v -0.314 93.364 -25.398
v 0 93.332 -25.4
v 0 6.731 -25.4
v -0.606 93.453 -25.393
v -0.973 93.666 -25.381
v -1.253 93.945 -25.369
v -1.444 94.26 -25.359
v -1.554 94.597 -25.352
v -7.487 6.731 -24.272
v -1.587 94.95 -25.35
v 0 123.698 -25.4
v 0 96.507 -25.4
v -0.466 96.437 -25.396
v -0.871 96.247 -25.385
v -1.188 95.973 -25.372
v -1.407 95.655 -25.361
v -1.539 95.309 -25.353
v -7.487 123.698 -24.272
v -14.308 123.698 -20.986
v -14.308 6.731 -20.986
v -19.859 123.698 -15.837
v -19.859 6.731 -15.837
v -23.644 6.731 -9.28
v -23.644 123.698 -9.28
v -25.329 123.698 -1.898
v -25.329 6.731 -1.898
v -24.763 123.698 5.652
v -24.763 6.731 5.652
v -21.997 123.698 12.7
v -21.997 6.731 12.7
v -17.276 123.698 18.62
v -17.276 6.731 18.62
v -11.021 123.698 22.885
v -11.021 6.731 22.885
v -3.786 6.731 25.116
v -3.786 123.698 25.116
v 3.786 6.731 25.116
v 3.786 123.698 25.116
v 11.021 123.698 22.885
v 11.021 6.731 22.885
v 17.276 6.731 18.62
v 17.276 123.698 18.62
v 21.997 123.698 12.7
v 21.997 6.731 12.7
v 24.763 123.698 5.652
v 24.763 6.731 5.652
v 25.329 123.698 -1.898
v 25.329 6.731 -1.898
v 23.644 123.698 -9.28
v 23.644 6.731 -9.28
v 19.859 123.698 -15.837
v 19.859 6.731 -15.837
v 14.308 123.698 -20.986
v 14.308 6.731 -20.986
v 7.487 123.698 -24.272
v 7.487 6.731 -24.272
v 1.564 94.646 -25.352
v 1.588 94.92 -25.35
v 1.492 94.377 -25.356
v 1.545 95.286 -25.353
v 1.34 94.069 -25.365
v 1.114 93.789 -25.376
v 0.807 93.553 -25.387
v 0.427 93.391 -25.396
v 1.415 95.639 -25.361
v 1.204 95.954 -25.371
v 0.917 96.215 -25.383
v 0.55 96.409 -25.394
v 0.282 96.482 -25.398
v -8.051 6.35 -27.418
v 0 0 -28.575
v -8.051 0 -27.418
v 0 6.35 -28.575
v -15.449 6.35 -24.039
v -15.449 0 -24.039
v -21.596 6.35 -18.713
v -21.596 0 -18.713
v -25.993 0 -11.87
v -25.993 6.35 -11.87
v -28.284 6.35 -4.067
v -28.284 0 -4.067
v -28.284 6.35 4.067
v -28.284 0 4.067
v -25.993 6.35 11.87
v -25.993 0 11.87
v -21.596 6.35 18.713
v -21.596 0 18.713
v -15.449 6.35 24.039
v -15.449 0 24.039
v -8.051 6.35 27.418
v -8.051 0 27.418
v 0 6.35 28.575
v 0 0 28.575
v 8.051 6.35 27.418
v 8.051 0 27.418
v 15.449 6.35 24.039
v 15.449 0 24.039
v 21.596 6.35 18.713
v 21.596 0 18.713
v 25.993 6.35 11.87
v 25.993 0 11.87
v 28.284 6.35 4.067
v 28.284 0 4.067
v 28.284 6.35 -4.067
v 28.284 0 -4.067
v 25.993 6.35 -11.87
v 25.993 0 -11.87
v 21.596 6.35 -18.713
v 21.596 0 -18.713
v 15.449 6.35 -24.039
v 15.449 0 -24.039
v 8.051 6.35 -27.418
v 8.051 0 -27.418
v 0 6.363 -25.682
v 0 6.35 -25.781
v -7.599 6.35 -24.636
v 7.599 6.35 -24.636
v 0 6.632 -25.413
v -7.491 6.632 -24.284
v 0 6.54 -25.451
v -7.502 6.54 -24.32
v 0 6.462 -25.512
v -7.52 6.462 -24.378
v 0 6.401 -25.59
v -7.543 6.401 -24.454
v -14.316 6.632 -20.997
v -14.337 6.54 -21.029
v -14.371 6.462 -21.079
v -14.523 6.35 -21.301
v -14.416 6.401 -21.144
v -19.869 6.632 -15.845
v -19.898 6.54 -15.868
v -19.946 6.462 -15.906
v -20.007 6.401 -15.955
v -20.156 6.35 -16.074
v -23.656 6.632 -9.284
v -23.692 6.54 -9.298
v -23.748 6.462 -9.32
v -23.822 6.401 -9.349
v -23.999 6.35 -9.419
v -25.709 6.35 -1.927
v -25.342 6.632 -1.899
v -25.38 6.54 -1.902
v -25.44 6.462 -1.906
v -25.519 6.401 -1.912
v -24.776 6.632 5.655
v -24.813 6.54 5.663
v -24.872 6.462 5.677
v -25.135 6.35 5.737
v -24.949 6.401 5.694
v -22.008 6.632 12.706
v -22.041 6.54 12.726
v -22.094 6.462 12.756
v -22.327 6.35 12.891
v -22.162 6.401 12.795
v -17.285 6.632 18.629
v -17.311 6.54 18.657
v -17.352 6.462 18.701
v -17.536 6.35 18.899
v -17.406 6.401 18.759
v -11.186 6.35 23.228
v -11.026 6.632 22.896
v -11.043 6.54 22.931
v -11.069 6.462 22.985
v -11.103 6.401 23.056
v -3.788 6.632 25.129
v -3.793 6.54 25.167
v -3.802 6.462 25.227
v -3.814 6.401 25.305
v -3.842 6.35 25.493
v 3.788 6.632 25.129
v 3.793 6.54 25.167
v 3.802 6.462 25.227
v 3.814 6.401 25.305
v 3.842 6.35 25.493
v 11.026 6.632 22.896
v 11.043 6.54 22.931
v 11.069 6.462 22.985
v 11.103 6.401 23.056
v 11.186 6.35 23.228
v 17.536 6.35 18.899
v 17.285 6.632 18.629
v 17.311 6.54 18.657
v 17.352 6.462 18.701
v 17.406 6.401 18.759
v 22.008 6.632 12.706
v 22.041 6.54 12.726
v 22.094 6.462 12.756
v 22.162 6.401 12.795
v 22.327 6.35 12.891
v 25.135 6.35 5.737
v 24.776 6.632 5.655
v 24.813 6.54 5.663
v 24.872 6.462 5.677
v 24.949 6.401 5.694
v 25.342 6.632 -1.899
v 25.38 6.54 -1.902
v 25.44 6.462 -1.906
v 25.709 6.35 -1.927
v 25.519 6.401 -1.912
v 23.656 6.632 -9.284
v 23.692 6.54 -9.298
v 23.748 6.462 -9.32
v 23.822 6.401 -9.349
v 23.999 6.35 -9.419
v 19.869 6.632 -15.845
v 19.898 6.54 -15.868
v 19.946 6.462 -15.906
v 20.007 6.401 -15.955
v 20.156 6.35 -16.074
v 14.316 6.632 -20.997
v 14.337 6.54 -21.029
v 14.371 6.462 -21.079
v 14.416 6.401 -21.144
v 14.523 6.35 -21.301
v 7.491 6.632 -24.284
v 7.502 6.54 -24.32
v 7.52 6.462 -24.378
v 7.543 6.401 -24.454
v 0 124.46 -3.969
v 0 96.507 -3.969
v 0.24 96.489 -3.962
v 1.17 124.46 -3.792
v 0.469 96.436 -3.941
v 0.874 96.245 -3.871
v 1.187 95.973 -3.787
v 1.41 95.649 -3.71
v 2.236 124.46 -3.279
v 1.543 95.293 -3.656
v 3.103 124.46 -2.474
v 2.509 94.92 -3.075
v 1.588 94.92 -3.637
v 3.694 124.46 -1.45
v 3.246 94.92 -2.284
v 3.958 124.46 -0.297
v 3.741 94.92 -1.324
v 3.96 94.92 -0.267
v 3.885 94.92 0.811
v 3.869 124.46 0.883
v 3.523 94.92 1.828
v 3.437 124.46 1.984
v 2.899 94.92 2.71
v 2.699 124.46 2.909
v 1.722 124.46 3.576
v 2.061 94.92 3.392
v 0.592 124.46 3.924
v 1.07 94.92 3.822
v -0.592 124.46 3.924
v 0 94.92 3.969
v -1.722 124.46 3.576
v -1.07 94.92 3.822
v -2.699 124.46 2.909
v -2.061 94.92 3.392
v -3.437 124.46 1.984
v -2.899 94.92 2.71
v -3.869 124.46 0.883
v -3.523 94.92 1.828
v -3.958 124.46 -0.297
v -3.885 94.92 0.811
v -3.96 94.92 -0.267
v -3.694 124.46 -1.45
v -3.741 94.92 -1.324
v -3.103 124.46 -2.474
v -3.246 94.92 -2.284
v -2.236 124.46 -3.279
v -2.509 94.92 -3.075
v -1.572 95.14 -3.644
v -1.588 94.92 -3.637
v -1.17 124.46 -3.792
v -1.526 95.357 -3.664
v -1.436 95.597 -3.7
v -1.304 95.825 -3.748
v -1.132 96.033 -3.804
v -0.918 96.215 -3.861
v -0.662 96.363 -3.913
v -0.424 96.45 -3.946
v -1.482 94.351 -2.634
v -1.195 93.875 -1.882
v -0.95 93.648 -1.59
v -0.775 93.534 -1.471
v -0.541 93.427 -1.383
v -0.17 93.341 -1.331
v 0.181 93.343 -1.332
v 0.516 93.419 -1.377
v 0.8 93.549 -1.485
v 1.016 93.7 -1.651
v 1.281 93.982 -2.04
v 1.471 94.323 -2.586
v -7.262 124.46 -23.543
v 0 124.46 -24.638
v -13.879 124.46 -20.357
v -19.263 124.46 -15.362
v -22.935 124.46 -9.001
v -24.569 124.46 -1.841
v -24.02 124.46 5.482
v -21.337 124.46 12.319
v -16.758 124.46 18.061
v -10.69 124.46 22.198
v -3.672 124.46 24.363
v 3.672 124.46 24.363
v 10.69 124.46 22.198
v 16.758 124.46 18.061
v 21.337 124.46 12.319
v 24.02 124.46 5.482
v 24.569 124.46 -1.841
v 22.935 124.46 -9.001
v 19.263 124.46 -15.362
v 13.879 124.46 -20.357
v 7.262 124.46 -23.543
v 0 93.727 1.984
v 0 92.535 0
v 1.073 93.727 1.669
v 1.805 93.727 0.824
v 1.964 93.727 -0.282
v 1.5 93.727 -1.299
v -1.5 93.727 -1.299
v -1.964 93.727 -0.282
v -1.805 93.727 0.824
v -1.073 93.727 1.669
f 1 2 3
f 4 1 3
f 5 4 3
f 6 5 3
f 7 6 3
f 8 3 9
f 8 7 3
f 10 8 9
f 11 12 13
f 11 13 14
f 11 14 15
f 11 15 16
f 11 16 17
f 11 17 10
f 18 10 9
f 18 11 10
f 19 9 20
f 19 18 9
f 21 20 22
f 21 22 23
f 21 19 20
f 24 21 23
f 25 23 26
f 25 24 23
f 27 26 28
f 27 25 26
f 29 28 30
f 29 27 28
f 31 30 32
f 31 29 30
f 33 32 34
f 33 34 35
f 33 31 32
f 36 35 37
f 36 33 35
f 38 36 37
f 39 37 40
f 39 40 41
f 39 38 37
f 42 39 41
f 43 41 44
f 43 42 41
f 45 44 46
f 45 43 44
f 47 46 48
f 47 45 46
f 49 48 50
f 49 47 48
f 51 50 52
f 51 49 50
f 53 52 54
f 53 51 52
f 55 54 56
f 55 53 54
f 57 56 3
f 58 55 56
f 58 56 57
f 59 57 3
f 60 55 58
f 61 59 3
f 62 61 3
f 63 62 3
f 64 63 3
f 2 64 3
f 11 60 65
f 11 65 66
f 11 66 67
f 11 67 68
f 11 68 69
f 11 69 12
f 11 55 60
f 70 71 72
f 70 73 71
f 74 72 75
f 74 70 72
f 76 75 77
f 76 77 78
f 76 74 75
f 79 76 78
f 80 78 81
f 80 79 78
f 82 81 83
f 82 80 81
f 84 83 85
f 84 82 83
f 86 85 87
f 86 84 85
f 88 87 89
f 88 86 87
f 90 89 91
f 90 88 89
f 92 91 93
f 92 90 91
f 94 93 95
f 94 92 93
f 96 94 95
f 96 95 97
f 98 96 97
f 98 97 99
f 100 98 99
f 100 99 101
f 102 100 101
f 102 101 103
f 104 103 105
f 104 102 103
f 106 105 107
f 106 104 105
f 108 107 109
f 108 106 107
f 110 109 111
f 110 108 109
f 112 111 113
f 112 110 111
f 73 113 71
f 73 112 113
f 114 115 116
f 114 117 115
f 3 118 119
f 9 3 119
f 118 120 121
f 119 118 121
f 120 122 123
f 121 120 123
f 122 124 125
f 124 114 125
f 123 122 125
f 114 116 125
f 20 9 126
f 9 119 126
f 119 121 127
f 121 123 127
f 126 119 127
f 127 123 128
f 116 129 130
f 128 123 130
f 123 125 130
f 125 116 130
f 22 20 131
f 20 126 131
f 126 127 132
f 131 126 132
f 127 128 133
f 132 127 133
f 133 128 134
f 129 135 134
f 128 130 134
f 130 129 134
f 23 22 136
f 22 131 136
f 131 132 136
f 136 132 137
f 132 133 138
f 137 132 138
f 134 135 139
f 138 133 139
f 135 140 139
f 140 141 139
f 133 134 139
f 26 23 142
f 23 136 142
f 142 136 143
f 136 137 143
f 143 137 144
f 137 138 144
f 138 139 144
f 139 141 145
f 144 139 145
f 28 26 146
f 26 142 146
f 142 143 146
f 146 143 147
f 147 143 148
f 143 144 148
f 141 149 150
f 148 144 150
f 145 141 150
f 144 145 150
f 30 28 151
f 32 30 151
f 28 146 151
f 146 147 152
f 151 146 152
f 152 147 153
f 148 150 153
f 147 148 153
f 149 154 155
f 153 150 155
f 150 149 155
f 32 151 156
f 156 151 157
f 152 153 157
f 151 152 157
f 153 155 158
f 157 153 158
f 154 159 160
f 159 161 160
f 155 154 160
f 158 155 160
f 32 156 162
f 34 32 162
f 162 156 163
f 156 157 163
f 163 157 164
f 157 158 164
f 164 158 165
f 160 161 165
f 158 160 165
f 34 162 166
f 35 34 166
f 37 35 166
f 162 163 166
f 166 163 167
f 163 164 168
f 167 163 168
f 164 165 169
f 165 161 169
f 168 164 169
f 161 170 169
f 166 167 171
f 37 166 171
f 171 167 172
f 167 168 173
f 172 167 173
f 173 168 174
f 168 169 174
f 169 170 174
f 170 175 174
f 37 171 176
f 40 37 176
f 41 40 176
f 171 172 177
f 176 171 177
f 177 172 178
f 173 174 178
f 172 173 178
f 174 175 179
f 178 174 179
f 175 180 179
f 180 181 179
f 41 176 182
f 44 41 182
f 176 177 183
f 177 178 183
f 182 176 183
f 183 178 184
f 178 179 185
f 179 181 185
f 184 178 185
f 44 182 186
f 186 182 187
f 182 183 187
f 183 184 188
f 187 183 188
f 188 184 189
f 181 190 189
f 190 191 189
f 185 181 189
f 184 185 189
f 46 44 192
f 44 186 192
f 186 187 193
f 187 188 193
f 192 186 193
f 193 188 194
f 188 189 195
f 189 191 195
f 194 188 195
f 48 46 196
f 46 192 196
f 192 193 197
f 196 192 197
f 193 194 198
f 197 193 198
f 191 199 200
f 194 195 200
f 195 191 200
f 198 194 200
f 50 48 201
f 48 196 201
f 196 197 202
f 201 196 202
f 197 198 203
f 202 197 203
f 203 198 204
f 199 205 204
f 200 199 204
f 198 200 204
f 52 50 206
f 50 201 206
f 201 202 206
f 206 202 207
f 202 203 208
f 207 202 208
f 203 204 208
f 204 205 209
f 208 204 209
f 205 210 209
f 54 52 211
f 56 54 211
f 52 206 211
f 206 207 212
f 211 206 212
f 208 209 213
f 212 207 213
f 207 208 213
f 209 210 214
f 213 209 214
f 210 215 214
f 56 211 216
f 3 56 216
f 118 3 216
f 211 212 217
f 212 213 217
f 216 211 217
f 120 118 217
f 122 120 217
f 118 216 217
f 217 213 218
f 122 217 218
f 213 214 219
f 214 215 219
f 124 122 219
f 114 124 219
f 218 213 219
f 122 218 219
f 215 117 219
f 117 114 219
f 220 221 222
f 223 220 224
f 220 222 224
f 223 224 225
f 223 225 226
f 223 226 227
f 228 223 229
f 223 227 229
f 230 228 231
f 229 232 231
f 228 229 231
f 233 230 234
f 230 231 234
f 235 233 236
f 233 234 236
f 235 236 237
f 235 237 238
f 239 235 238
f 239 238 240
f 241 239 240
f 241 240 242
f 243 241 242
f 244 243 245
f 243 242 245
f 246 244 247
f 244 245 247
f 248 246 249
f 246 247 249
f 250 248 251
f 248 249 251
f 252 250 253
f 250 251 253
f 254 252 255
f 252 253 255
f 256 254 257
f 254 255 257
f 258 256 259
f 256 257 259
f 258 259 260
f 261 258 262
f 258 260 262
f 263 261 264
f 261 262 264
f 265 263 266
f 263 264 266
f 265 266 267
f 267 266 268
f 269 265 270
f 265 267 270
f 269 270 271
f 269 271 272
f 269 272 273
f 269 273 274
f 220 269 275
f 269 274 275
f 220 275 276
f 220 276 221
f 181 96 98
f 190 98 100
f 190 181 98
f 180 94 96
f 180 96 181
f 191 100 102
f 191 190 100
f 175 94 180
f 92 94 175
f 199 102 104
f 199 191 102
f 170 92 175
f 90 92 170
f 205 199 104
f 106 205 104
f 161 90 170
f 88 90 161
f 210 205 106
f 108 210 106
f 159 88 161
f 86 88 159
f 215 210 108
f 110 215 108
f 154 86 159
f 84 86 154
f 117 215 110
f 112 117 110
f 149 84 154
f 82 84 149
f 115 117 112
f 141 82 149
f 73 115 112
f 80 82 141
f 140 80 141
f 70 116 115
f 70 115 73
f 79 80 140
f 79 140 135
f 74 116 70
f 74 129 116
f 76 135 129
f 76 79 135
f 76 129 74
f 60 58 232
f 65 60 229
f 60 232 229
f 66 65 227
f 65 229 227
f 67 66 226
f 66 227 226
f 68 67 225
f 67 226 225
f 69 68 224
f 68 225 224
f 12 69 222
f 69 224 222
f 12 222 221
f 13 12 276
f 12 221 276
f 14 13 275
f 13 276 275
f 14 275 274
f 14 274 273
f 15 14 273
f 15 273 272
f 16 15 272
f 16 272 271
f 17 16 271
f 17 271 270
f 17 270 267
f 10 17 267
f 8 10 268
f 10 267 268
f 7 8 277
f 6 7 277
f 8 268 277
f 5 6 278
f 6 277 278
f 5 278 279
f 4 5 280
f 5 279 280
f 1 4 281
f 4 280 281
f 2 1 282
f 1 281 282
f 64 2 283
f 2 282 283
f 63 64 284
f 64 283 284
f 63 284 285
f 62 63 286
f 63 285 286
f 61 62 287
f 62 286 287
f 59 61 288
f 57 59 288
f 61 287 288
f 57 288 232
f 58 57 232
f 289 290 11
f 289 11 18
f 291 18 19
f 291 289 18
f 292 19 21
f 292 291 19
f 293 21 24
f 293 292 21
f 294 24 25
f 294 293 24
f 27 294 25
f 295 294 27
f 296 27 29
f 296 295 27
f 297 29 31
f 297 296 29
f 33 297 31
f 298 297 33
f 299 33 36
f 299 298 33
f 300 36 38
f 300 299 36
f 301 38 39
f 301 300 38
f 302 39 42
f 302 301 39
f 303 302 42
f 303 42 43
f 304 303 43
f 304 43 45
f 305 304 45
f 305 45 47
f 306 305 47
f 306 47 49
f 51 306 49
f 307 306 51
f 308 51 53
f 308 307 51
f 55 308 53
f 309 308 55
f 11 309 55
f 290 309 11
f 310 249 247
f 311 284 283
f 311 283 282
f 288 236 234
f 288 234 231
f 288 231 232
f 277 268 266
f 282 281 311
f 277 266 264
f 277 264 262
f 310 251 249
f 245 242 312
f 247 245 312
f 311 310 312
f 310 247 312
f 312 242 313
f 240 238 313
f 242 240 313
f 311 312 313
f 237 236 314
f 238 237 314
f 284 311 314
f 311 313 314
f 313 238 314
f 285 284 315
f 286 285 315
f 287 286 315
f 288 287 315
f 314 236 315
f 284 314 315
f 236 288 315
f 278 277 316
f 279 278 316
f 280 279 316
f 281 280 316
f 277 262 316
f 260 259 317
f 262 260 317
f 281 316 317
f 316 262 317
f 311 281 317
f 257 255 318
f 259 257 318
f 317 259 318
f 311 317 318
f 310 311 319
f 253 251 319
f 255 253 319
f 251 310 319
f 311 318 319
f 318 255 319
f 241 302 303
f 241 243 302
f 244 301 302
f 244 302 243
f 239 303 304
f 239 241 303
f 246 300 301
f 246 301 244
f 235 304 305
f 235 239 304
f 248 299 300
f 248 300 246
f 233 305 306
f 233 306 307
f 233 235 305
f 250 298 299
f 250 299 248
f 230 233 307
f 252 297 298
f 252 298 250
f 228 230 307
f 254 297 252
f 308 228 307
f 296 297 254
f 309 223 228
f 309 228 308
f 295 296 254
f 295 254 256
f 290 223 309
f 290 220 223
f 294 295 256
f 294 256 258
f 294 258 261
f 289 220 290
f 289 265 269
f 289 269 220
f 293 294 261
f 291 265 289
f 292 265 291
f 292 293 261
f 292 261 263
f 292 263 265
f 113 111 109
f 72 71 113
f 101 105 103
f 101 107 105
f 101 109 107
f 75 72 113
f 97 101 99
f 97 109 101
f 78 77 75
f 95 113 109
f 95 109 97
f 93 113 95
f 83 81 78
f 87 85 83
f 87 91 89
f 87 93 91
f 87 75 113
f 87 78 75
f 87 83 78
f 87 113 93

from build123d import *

# Parameters (mm, degrees)
F_3_8_16_TAPPED_HOLE1_D     = 7.9375
F_3_8_16_TAPPED_HOLE1_DEPTH = 29.5402
F_3_8_16_TAPPED_HOLE1_TIP   = 2.384665582
CHAMFER1_SIZE               = 0.762
FILLET1_R                   = 0.381
SKETCH4_R                   = 1.5875
CUT_EXTRUDE1_DEPTH          = 27.94


with BuildPart() as part:
    # Sketch1 → Revolve1 (revolve)
    with BuildSketch(Plane.XY, mode=Mode.PRIVATE) as revolve1_sk:
        Polygon((0, 0), (28.575, 0), (28.575, 6.35), (25.4, 6.35), (25.4, 124.46), (0, 124.46), align=None)
    revolve(revolve1_sk.sketch.rotate(Axis((0, 0, 0), (0, 1, 0)), 90), axis=Axis((0, 0, 0), (0, 1, 0)))  # turned: the seam where the file's is

    # 3/8-16 Tapped Hole1
    with Locations(Plane.ZX.offset(124.46)):
        with Locations((0, 0)):
            Hole(F_3_8_16_TAPPED_HOLE1_D / 2, depth=F_3_8_16_TAPPED_HOLE1_DEPTH)
            with Locations((0, 0, -(F_3_8_16_TAPPED_HOLE1_DEPTH + F_3_8_16_TAPPED_HOLE1_TIP / 2))):  # 118° drill point
                Cone(0, F_3_8_16_TAPPED_HOLE1_D / 2, F_3_8_16_TAPPED_HOLE1_TIP, mode=Mode.SUBTRACT)

    # Chamfer1
    chamfer1_edges = [part.edges().sort_by_distance(p)[0] for p in [
        (0, 124.46, 25.4),
    ]]
    chamfer(chamfer1_edges, length=CHAMFER1_SIZE)

    # Fillet1
    fillet1_edges = [part.edges().sort_by_distance(p)[0] for p in [
        (0, 6.35, 25.4),
    ]]
    fillet(fillet1_edges, radius=FILLET1_R)

    # Sketch4 → Cut-Extrude1 (cut)
    with BuildSketch(Plane.XY):
        with Locations((0, 94.9198)):
            Circle(SKETCH4_R)
    extrude(amount=-CUT_EXTRUDE1_DEPTH, mode=Mode.SUBTRACT)


solid = part.part
